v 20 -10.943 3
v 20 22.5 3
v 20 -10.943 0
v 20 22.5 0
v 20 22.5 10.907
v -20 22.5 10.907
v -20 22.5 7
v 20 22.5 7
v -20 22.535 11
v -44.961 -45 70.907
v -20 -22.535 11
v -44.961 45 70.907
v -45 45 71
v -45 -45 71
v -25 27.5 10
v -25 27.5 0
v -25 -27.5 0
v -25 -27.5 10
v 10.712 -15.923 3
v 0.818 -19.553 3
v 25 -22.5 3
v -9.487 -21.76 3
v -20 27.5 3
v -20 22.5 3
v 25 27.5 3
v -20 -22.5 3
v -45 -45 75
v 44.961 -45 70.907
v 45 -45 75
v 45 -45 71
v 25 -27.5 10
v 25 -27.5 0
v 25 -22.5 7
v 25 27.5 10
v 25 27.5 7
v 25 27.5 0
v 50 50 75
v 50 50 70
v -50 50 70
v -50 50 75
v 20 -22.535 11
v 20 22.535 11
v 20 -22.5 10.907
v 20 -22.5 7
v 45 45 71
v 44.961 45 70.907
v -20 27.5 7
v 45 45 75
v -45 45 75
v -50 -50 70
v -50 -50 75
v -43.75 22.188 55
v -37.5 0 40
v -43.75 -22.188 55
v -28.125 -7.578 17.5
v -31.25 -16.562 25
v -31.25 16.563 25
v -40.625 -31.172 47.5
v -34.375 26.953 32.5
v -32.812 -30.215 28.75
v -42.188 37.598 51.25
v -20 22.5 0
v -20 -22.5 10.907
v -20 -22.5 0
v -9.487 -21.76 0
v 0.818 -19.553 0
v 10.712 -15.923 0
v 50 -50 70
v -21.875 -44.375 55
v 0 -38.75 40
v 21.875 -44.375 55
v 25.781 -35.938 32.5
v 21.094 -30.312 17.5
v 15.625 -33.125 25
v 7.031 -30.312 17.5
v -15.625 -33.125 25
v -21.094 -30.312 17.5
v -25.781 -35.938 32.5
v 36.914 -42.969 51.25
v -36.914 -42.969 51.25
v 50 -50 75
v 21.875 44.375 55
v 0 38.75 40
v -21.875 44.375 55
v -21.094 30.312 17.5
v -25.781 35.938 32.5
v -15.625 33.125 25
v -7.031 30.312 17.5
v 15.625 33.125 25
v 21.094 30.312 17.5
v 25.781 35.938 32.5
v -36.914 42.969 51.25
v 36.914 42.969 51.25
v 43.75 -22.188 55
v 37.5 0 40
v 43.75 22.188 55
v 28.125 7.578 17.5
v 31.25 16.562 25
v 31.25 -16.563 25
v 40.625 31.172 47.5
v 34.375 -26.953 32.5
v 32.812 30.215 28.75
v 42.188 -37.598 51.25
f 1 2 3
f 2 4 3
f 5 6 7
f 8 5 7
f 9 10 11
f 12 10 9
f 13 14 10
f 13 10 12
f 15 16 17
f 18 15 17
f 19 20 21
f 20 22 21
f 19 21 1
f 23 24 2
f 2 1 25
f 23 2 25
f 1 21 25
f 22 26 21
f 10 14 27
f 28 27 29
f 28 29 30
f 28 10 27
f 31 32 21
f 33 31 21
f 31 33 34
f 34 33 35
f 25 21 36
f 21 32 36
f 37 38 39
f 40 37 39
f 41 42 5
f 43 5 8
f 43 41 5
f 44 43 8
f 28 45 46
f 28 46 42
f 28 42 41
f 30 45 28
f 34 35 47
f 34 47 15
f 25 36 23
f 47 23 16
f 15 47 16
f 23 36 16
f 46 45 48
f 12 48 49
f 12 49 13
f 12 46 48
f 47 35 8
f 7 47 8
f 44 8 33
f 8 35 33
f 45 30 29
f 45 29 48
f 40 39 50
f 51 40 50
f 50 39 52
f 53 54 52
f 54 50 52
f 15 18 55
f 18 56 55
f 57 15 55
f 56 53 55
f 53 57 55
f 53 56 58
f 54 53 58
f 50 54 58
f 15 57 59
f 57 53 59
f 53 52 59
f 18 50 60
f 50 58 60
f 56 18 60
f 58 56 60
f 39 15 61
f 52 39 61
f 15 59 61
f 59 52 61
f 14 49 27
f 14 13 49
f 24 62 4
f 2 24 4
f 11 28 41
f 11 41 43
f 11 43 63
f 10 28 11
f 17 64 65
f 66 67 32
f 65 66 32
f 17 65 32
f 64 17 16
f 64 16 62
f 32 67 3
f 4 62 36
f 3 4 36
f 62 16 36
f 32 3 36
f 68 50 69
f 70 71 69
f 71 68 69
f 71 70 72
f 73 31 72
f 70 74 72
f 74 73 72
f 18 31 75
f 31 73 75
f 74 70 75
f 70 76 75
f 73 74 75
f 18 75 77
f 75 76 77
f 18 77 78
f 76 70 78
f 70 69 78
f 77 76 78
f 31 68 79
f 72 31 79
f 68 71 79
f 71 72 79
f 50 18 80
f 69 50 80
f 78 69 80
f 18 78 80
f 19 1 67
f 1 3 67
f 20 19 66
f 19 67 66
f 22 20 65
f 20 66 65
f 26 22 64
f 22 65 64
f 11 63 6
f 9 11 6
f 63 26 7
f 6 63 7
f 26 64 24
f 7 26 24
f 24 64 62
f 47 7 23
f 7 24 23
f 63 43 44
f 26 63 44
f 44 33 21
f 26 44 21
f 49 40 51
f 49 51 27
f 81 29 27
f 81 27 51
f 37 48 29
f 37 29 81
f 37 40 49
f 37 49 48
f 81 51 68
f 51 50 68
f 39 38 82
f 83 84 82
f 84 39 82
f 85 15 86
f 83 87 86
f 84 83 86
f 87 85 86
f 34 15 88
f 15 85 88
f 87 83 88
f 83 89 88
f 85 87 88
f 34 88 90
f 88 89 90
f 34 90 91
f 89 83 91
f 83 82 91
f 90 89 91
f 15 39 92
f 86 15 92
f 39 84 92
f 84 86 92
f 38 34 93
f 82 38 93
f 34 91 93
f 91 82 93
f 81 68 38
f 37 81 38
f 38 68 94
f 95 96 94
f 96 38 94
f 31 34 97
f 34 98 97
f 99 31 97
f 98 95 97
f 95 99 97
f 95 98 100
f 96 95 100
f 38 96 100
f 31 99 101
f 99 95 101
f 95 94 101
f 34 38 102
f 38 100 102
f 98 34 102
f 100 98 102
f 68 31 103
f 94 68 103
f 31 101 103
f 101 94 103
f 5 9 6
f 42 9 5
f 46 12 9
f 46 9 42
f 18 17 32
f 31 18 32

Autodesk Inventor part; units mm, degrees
ref_plane "YZ Plane" through (0, 0, 0) normal (1, 0, 0) x (0, 1, 0)
ref_plane "XZ Plane" through (0, 0, 0) normal (0, 1, 0) x (-1, 0, 0)
sketch "Sketch1" plane through (0, 0, 0) normal (0, 0, 1) x (1, 0, 0)
  line L0 (-25, -27.5) -> (25, -27.5)
  line L1 (25, -27.5) -> (25, 27.5)
  line L2 (25, 27.5) -> (-25, 27.5)
  line L3 (-25, 27.5) -> (-25, -27.5)
  line L4 (-25, -27.5) -> (25, 27.5) construction
  line L5 (25, -27.5) -> (-25, 27.5) construction
  point P0 (0, 0)
  dimension "d0" = 50
  dimension "d1" = 55
extrude "Extrusion1" add sketch "Sketch1" along normal blind 10
ref_plane "Work Plane1" through (0, 0, 70) normal (0, 0, 1) x (1, 0, 0)
sketch "Sketch3" plane through (0, 0, 70) normal (0, 0, 1) x (1, 0, 0)
  line L0 (-50, -50) -> (50, -50)
  line L1 (50, -50) -> (50, 50)
  line L2 (50, 50) -> (-50, 50)
  line L3 (-50, 50) -> (-50, -50)
  line L4 (-50, -50) -> (50, 50) construction
  line L5 (50, -50) -> (-50, 50) construction
  line L6 (-42.5, -42.5) -> (42.5, 42.5) construction
  line L7 (42.5, -42.5) -> (-42.5, 42.5) construction
  point P0 (0, 0)
  dimension "d9" = 100
  dimension "d10" = 100
extrude "Extrusion3" add sketch "Sketch3" along normal blind 5
loft "Loft1" add section 1 edges at (0, -27.5, 10) (25, 0, 10) (0, 27.5, 10) (-25, 0, 10) section 2 edges at (0, -50, 70) (-50, 0, 70) (0, 50, 70) (50, 0, 70)
shell "Shell2" thickness 5 removed faces 1 at (-16.6667, 16.6667, 75)
sketch "Sketch4" plane through (25, -27.5, 0) normal (1, 0, 0) x (0, 0, -1)
  line L0 (0, 55) -> (-10, 55) projected
  line L1 (0, 0) -> (-10, 0) projected
  line L2 (-3, 55) -> (-7, 55)
  line L3 (-7, 55) -> (-7, 5)
  line L4 (-7, 5) -> (-3, 5)
  line L5 (-3, 5) -> (-3, 55)
  point P0 (0, 27.5)
  dimension "d28" = 4
  dimension "d29" = 3
  dimension "d30" = 5
extrude "Extrusion4" cut sketch "Sketch4" against normal up to surface (45 mm away)
sketch "Sketch5" plane through (0, 0, 0) normal (0, 0, -1) x (-1, 0, 0)
  line L0 (-20, 22.5) -> (20, 22.5) construction
  line L1 (20, 22.5) -> (-20, 22.5) projected
  line L2 (20, -22.5) -> (20, 52.5) construction
  arc A0 (-20, -10.9429) -> (20, -22.5) centre (20, 52.5) ccw
  line L3 (20, -22.5) -> (20, 22.5)
  line L4 (-20, 22.5) -> (-20, -22.5) projected
  line L5 (-20, 22.5) -> (-20, -22.5) projected
  line L6 (-20, -22.5) -> (-20, -22.535) projected
  line L7 (-20, -22.535) -> (-20, 22.535) projected
  line L8 (-20, 22.5) -> (-20, 22.535) projected
  line L9 (-20, -10.9429) -> (-20, 22.5)
  line L10 (20, 22.5) -> (-20, 22.5)
  point P0 (0, 0)
  dimension "d31" = 75
extrude "Extrusion5" cut sketch "Sketch5" against normal through all
properties part number "funnel_"
